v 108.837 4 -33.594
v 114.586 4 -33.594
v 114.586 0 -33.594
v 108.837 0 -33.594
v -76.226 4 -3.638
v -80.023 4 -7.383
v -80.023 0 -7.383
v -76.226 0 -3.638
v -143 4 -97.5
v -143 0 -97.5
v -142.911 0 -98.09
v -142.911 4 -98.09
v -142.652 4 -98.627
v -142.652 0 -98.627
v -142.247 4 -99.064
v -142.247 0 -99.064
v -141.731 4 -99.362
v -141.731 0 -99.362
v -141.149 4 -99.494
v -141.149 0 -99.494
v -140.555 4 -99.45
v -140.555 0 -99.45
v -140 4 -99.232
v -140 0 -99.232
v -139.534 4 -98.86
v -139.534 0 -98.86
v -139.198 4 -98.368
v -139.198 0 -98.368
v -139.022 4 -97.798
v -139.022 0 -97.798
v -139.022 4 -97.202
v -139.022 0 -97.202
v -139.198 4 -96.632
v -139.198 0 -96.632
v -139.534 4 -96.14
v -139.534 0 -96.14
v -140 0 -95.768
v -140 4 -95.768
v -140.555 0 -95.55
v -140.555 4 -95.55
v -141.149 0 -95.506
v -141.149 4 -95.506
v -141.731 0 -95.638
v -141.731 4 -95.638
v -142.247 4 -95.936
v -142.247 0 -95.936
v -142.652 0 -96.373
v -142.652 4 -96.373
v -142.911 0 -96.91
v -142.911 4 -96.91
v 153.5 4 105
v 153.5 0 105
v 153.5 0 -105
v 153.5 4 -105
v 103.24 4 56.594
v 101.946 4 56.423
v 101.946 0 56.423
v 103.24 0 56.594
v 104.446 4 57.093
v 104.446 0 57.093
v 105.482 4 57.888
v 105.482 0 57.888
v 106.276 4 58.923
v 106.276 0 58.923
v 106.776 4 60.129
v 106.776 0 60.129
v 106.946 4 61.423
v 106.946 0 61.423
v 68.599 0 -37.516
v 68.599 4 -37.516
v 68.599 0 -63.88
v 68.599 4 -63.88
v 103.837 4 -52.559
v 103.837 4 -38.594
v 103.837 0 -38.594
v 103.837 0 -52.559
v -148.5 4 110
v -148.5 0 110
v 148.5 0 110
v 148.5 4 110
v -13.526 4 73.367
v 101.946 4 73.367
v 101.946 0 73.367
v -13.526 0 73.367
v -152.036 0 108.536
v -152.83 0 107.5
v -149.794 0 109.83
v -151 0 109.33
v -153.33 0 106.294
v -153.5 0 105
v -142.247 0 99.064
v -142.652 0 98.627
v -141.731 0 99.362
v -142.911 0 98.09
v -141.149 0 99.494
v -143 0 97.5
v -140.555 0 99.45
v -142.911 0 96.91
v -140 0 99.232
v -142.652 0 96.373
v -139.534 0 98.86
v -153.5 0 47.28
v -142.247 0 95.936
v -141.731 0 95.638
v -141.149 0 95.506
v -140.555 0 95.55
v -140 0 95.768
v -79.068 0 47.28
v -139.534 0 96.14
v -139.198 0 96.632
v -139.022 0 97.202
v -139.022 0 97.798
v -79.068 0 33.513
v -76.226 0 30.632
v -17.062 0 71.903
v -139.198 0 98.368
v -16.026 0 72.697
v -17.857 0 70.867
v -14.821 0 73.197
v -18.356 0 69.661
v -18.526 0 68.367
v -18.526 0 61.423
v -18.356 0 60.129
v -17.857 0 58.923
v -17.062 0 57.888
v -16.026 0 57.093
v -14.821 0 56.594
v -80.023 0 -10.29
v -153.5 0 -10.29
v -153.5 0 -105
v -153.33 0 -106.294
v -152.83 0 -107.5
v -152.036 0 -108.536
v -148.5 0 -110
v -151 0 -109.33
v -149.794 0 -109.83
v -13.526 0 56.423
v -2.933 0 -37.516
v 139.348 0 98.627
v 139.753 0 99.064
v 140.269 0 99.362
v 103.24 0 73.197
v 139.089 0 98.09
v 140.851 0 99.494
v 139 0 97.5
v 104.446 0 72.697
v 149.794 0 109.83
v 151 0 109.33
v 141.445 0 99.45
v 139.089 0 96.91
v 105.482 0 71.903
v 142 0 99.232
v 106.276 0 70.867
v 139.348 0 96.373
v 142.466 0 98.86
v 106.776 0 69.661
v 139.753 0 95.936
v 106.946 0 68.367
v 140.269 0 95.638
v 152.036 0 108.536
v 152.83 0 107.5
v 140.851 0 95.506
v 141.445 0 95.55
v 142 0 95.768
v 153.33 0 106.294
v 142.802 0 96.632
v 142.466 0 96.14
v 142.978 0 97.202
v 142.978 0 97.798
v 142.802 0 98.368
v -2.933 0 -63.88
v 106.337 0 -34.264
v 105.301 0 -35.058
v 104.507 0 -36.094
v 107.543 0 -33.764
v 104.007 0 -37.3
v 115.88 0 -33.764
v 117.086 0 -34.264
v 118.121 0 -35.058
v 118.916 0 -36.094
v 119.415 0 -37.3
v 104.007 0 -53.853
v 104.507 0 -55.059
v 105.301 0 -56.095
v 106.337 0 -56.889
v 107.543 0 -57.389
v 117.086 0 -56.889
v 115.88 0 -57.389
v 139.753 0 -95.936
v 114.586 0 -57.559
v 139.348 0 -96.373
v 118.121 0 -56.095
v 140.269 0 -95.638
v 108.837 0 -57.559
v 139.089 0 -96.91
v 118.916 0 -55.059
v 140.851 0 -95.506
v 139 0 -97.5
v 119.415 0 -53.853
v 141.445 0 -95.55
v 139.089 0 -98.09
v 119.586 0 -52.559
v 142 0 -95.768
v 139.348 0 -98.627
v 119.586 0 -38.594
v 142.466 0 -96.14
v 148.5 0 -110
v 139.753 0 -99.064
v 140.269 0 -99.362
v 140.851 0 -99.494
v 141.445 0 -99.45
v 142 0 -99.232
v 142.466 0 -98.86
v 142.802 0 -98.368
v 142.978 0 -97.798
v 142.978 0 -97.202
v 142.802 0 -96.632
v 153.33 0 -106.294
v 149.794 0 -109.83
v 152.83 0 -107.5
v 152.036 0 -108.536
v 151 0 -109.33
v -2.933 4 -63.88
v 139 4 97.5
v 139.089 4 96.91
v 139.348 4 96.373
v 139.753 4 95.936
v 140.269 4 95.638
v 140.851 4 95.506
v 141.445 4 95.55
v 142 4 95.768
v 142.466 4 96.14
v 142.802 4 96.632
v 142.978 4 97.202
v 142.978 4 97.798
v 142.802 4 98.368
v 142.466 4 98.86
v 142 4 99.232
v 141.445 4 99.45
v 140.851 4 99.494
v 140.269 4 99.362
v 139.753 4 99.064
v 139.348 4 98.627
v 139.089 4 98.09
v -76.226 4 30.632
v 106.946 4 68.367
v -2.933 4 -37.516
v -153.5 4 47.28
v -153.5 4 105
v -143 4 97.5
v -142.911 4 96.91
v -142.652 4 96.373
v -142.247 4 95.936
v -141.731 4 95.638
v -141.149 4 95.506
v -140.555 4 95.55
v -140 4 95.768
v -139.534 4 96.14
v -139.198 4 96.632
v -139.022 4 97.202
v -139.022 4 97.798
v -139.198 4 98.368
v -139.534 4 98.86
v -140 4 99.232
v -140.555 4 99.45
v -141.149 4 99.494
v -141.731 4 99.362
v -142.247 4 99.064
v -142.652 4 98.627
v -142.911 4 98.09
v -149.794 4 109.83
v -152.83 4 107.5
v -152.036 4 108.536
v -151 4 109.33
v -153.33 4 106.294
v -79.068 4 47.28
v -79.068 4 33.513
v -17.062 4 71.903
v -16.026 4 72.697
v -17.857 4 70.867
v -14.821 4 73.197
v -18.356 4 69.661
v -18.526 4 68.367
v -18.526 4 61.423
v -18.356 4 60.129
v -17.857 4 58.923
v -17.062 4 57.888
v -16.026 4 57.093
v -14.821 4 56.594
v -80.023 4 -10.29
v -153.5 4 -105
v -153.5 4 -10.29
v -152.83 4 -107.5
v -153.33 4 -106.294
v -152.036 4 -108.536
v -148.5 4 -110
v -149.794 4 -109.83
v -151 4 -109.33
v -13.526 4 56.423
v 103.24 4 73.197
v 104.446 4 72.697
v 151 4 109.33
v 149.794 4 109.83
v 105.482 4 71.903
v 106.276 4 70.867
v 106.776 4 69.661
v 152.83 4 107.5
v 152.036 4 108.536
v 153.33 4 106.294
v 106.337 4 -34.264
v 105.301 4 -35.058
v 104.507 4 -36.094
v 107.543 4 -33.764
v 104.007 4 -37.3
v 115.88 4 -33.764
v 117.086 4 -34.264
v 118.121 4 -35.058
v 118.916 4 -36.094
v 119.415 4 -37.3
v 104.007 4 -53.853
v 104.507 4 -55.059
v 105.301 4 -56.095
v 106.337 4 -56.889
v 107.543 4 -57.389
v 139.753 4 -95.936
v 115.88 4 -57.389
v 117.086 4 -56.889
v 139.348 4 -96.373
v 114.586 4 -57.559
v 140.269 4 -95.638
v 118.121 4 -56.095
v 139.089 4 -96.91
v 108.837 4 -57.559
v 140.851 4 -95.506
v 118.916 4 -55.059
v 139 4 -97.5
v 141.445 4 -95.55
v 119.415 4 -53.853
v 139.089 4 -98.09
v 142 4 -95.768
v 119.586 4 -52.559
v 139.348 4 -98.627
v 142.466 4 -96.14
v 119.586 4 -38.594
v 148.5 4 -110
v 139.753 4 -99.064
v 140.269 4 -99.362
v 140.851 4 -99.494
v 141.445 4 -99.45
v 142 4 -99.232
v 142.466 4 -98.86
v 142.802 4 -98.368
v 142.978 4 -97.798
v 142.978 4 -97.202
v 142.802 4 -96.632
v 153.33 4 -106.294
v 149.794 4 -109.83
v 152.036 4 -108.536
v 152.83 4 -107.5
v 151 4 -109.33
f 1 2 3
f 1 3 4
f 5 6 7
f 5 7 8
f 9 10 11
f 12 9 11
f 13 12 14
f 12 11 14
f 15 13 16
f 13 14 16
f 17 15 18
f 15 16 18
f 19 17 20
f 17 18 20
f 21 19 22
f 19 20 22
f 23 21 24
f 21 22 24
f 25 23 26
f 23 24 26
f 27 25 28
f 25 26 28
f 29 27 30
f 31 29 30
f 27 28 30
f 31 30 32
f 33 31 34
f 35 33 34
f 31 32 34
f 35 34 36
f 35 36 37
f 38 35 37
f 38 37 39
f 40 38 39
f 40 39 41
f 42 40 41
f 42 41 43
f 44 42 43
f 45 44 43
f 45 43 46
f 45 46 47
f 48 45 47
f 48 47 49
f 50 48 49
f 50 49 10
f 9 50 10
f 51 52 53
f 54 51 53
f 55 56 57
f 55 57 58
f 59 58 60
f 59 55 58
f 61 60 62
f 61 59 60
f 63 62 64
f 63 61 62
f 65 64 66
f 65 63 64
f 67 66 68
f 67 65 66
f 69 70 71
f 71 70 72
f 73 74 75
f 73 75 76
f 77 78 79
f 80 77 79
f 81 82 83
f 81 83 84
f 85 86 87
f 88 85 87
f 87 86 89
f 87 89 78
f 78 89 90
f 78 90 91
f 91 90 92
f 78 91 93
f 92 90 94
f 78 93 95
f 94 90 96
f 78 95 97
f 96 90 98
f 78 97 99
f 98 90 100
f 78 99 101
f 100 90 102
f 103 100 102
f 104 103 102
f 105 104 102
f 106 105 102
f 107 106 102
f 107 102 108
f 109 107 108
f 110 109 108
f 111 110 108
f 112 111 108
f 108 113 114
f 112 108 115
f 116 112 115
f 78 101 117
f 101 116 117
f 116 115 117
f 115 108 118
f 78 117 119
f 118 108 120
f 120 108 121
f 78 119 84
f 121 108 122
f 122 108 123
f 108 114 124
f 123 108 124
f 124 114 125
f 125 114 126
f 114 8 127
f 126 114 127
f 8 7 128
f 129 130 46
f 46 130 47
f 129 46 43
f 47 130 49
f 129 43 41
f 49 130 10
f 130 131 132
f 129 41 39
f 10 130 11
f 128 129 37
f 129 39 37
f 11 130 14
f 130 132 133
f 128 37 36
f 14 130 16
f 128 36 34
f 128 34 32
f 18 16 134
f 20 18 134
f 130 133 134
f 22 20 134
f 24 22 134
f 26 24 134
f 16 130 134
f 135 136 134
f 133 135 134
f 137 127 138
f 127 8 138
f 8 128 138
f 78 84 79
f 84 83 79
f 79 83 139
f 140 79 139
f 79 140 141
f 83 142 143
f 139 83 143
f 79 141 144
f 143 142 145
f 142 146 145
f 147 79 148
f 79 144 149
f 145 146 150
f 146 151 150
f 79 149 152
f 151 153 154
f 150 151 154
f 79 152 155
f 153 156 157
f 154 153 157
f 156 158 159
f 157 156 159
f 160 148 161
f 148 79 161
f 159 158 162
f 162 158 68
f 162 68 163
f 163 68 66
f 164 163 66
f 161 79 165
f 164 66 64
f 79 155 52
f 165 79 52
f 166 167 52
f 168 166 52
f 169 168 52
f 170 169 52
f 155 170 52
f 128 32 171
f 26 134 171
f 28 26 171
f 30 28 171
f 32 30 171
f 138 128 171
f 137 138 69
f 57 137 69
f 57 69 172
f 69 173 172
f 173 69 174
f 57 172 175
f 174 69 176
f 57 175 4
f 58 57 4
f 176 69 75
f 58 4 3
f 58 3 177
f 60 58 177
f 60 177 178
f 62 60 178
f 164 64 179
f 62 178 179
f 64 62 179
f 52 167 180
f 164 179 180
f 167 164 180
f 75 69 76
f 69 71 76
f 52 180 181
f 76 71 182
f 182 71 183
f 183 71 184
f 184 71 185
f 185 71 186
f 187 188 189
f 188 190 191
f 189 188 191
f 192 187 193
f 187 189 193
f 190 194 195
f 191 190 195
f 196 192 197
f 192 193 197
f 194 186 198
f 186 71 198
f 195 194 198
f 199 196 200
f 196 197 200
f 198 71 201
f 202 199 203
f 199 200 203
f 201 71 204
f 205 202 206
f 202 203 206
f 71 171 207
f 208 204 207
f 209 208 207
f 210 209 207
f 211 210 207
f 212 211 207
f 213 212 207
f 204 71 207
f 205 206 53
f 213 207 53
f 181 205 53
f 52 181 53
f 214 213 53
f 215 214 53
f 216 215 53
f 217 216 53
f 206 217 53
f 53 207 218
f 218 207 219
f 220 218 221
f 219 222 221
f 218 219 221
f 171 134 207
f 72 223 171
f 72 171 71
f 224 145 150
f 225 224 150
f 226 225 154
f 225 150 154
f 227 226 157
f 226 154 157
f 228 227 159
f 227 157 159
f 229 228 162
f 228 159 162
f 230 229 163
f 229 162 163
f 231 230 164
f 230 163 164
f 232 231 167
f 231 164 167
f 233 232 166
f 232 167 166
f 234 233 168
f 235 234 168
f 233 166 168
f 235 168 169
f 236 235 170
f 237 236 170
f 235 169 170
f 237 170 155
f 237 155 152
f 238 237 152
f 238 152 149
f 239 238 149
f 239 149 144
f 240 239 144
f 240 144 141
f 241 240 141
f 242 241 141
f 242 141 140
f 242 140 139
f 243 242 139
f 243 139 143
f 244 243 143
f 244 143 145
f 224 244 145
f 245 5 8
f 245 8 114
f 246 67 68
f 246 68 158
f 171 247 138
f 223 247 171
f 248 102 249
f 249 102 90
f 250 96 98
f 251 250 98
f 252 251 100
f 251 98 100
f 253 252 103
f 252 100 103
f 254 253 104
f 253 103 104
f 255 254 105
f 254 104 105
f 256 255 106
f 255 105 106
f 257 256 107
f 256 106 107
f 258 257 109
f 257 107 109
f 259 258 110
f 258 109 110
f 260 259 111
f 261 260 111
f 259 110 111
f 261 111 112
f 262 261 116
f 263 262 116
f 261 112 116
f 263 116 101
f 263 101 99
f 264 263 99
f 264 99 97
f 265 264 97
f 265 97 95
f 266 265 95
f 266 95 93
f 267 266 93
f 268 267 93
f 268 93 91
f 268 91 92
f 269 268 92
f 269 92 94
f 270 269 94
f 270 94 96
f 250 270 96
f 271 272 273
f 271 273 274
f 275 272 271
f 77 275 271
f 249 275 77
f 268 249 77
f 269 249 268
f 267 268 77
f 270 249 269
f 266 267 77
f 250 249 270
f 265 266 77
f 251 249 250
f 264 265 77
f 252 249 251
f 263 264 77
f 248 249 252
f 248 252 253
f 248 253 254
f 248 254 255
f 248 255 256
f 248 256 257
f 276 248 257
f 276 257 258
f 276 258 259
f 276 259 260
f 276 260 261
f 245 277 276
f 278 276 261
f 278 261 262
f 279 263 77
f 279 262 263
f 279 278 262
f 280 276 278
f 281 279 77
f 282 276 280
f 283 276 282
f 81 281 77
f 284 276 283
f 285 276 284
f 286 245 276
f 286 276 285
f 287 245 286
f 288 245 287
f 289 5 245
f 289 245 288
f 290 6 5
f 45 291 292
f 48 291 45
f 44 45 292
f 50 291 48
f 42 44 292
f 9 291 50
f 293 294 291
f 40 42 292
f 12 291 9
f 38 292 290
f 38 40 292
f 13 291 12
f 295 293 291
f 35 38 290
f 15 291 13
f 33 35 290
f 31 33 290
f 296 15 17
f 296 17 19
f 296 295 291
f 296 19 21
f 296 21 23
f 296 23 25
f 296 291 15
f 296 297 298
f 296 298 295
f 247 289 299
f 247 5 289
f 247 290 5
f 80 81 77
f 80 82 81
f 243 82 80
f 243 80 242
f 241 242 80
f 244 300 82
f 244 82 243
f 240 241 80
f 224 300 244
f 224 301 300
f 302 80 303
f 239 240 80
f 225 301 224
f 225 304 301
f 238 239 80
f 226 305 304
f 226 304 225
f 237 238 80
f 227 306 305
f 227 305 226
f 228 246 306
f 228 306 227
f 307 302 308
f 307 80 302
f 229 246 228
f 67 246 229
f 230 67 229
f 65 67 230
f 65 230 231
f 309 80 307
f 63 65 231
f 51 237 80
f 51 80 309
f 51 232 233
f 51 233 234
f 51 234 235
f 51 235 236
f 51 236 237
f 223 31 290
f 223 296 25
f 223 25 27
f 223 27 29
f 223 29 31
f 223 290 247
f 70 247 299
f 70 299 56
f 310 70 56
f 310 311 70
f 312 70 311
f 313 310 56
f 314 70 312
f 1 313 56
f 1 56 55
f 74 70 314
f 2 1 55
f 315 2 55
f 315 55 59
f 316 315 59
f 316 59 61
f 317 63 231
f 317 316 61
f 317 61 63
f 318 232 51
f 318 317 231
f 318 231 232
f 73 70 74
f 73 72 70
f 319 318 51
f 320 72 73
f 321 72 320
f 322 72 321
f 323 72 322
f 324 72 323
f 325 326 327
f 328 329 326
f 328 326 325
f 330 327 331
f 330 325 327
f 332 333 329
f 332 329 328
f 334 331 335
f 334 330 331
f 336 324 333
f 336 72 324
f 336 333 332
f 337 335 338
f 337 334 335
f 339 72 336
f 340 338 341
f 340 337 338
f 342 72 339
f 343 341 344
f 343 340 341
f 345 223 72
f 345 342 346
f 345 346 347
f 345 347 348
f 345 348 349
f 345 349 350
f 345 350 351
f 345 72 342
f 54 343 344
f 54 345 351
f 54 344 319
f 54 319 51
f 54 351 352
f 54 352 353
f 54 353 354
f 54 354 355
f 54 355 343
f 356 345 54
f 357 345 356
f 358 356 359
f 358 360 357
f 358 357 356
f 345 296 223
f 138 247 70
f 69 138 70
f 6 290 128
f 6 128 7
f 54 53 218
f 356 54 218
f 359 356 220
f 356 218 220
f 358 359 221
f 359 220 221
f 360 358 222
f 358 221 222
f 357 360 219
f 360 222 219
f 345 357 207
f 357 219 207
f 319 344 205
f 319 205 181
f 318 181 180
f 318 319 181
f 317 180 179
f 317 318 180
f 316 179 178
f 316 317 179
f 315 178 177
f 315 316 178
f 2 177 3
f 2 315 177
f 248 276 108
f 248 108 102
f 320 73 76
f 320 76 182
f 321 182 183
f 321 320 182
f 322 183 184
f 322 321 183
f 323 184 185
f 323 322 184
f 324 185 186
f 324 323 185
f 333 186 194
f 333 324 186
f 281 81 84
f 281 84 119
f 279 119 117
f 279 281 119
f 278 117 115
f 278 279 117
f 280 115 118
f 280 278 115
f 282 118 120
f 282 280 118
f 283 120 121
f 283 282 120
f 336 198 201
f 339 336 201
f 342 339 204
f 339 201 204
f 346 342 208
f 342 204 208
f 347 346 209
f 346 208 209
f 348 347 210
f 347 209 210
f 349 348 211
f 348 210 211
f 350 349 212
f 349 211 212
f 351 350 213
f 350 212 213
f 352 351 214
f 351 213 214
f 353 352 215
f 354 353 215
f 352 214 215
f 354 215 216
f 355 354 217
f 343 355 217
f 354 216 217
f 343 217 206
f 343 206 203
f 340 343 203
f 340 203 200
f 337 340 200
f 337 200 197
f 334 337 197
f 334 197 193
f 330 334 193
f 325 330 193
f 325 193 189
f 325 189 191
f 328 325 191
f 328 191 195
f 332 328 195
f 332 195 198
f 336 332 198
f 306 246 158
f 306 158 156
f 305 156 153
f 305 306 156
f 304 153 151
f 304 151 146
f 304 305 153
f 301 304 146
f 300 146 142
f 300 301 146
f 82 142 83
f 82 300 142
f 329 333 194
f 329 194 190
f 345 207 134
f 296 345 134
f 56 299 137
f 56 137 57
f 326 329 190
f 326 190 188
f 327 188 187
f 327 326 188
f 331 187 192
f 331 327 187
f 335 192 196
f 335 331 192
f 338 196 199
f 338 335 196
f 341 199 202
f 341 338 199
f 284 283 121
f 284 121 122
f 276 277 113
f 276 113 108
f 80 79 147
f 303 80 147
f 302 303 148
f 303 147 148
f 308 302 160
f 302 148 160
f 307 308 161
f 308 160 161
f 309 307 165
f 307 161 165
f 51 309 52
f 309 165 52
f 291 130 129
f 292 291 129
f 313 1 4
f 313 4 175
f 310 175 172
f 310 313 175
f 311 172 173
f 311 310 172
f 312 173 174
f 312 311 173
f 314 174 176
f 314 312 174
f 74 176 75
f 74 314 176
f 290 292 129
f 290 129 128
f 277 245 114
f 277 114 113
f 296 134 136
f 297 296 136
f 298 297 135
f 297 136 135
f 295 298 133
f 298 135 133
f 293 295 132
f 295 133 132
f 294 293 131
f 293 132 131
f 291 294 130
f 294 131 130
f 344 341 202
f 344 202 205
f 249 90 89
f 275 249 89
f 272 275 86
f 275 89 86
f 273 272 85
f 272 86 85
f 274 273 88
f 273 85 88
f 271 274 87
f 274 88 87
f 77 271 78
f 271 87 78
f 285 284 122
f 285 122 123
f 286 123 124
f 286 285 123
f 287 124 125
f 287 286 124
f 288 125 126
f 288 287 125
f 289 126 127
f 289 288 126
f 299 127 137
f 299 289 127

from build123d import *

# Parameters (mm, degrees)
BOSS_EXTRUDE1_DEPTH   = 4
SKETCH4_W             = 71.532637276
SKETCH4_H             = 26.364466528
CUT_EXTRUDE1_DEPTH    = 4
F_4_0MM_DOWEL_HOLE1_D = 4


with BuildPart() as part:
    # Sketch1 → Boss-Extrude1 (new body)
    with BuildSketch(Plane(origin=(0, 0, 0), x_dir=(1, 0, 0), z_dir=(0, 1, 0))):
        with BuildLine():
            Line((-148.5, -110), (148.5, -110))
            ThreePointArc((148.5, -110), (152.035533906, -108.535533906), (153.5, -105))
            Line((153.5, -105), (153.5, 105))
            ThreePointArc((153.5, 105), (152.035533906, 108.535533906), (148.5, 110))
            Line((148.5, 110), (-148.5, 110))
            ThreePointArc((-148.5, 110), (-152.035533906, 108.535533906), (-153.5, 105))
            Line((-153.5, 105), (-153.5, -105))
            ThreePointArc((-153.5, -105), (-152.035533906, -108.535533906), (-148.5, -110))
        make_face()
    extrude(amount=BOSS_EXTRUDE1_DEPTH)

    # Sketch4 → Cut-Extrude1 (cut)
    with BuildSketch(Plane(origin=(0, 4, 0), x_dir=(1, 0, 0), z_dir=(0, 1, 0))):
        Polygon((-153.5, 10.290131999), (-80.023243562, 10.290131999), (-80.023243562, 7.383174491), (-76.226434875, 3.638376882), (-76.226434875, -30.63211249), (-79.068246362, -33.513393581), (-79.068246362, -47.279961532), (-153.5, -47.279961532), align=None)
        with Locations((32.833027244, 50.697784315)):
            Rectangle(SKETCH4_W, SKETCH4_H)
        with BuildLine():
            Line((108.837010637, 57.559292177), (114.585798826, 57.559292177))
            ThreePointArc((114.585798826, 57.559292177), (118.121332732, 56.094826083), (119.585798826, 52.559292177))
            Line((119.585798826, 52.559292177), (119.585798826, 38.593744934))
            ThreePointArc((119.585798826, 38.593744934), (118.121332732, 35.058211028), (114.585798826, 33.593744934))
            Line((114.585798826, 33.593744934), (108.837010637, 33.593744934))
            ThreePointArc((108.837010637, 33.593744934), (105.301476732, 35.058211028), (103.837010637, 38.593744934))
            Line((103.837010637, 38.593744934), (103.837010637, 52.559292177))
            ThreePointArc((103.837010637, 52.559292177), (105.301476732, 56.094826083), (108.837010637, 57.559292177))
        make_face()
        with BuildLine():
            Line((-13.526451363, -56.423479831), (101.946204315, -56.423479831))
            ThreePointArc((101.946204315, -56.423479831), (105.481738221, -57.887945925), (106.946204315, -61.423479831))
            Line((106.946204315, -61.423479831), (106.946204315, -68.367080563))
            ThreePointArc((106.946204315, -68.367080563), (105.481738221, -71.902614469), (101.946204315, -73.367080563))
            Line((101.946204315, -73.367080563), (-13.526451363, -73.367080563))
            ThreePointArc((-13.526451363, -73.367080563), (-17.061985269, -71.902614469), (-18.526451363, -68.367080563))
            Line((-18.526451363, -68.367080563), (-18.526451363, -61.423479831))
            ThreePointArc((-18.526451363, -61.423479831), (-17.061985269, -57.887945925), (-13.526451363, -56.423479831))
        make_face()
    extrude(amount=-CUT_EXTRUDE1_DEPTH, mode=Mode.SUBTRACT)

    # Ø4.0mm Dowel Hole1 (through all)
    with Locations(Plane(origin=(0, 4, 0), x_dir=(1, 0, 0), z_dir=(0, 1, 0))):
        with Locations((-141, -97.5000082), (140.9999974, -97.5000082), (141, 97.5), (-141, 97.5)):
            Hole(F_4_0MM_DOWEL_HOLE1_D / 2)


solid = part.part
